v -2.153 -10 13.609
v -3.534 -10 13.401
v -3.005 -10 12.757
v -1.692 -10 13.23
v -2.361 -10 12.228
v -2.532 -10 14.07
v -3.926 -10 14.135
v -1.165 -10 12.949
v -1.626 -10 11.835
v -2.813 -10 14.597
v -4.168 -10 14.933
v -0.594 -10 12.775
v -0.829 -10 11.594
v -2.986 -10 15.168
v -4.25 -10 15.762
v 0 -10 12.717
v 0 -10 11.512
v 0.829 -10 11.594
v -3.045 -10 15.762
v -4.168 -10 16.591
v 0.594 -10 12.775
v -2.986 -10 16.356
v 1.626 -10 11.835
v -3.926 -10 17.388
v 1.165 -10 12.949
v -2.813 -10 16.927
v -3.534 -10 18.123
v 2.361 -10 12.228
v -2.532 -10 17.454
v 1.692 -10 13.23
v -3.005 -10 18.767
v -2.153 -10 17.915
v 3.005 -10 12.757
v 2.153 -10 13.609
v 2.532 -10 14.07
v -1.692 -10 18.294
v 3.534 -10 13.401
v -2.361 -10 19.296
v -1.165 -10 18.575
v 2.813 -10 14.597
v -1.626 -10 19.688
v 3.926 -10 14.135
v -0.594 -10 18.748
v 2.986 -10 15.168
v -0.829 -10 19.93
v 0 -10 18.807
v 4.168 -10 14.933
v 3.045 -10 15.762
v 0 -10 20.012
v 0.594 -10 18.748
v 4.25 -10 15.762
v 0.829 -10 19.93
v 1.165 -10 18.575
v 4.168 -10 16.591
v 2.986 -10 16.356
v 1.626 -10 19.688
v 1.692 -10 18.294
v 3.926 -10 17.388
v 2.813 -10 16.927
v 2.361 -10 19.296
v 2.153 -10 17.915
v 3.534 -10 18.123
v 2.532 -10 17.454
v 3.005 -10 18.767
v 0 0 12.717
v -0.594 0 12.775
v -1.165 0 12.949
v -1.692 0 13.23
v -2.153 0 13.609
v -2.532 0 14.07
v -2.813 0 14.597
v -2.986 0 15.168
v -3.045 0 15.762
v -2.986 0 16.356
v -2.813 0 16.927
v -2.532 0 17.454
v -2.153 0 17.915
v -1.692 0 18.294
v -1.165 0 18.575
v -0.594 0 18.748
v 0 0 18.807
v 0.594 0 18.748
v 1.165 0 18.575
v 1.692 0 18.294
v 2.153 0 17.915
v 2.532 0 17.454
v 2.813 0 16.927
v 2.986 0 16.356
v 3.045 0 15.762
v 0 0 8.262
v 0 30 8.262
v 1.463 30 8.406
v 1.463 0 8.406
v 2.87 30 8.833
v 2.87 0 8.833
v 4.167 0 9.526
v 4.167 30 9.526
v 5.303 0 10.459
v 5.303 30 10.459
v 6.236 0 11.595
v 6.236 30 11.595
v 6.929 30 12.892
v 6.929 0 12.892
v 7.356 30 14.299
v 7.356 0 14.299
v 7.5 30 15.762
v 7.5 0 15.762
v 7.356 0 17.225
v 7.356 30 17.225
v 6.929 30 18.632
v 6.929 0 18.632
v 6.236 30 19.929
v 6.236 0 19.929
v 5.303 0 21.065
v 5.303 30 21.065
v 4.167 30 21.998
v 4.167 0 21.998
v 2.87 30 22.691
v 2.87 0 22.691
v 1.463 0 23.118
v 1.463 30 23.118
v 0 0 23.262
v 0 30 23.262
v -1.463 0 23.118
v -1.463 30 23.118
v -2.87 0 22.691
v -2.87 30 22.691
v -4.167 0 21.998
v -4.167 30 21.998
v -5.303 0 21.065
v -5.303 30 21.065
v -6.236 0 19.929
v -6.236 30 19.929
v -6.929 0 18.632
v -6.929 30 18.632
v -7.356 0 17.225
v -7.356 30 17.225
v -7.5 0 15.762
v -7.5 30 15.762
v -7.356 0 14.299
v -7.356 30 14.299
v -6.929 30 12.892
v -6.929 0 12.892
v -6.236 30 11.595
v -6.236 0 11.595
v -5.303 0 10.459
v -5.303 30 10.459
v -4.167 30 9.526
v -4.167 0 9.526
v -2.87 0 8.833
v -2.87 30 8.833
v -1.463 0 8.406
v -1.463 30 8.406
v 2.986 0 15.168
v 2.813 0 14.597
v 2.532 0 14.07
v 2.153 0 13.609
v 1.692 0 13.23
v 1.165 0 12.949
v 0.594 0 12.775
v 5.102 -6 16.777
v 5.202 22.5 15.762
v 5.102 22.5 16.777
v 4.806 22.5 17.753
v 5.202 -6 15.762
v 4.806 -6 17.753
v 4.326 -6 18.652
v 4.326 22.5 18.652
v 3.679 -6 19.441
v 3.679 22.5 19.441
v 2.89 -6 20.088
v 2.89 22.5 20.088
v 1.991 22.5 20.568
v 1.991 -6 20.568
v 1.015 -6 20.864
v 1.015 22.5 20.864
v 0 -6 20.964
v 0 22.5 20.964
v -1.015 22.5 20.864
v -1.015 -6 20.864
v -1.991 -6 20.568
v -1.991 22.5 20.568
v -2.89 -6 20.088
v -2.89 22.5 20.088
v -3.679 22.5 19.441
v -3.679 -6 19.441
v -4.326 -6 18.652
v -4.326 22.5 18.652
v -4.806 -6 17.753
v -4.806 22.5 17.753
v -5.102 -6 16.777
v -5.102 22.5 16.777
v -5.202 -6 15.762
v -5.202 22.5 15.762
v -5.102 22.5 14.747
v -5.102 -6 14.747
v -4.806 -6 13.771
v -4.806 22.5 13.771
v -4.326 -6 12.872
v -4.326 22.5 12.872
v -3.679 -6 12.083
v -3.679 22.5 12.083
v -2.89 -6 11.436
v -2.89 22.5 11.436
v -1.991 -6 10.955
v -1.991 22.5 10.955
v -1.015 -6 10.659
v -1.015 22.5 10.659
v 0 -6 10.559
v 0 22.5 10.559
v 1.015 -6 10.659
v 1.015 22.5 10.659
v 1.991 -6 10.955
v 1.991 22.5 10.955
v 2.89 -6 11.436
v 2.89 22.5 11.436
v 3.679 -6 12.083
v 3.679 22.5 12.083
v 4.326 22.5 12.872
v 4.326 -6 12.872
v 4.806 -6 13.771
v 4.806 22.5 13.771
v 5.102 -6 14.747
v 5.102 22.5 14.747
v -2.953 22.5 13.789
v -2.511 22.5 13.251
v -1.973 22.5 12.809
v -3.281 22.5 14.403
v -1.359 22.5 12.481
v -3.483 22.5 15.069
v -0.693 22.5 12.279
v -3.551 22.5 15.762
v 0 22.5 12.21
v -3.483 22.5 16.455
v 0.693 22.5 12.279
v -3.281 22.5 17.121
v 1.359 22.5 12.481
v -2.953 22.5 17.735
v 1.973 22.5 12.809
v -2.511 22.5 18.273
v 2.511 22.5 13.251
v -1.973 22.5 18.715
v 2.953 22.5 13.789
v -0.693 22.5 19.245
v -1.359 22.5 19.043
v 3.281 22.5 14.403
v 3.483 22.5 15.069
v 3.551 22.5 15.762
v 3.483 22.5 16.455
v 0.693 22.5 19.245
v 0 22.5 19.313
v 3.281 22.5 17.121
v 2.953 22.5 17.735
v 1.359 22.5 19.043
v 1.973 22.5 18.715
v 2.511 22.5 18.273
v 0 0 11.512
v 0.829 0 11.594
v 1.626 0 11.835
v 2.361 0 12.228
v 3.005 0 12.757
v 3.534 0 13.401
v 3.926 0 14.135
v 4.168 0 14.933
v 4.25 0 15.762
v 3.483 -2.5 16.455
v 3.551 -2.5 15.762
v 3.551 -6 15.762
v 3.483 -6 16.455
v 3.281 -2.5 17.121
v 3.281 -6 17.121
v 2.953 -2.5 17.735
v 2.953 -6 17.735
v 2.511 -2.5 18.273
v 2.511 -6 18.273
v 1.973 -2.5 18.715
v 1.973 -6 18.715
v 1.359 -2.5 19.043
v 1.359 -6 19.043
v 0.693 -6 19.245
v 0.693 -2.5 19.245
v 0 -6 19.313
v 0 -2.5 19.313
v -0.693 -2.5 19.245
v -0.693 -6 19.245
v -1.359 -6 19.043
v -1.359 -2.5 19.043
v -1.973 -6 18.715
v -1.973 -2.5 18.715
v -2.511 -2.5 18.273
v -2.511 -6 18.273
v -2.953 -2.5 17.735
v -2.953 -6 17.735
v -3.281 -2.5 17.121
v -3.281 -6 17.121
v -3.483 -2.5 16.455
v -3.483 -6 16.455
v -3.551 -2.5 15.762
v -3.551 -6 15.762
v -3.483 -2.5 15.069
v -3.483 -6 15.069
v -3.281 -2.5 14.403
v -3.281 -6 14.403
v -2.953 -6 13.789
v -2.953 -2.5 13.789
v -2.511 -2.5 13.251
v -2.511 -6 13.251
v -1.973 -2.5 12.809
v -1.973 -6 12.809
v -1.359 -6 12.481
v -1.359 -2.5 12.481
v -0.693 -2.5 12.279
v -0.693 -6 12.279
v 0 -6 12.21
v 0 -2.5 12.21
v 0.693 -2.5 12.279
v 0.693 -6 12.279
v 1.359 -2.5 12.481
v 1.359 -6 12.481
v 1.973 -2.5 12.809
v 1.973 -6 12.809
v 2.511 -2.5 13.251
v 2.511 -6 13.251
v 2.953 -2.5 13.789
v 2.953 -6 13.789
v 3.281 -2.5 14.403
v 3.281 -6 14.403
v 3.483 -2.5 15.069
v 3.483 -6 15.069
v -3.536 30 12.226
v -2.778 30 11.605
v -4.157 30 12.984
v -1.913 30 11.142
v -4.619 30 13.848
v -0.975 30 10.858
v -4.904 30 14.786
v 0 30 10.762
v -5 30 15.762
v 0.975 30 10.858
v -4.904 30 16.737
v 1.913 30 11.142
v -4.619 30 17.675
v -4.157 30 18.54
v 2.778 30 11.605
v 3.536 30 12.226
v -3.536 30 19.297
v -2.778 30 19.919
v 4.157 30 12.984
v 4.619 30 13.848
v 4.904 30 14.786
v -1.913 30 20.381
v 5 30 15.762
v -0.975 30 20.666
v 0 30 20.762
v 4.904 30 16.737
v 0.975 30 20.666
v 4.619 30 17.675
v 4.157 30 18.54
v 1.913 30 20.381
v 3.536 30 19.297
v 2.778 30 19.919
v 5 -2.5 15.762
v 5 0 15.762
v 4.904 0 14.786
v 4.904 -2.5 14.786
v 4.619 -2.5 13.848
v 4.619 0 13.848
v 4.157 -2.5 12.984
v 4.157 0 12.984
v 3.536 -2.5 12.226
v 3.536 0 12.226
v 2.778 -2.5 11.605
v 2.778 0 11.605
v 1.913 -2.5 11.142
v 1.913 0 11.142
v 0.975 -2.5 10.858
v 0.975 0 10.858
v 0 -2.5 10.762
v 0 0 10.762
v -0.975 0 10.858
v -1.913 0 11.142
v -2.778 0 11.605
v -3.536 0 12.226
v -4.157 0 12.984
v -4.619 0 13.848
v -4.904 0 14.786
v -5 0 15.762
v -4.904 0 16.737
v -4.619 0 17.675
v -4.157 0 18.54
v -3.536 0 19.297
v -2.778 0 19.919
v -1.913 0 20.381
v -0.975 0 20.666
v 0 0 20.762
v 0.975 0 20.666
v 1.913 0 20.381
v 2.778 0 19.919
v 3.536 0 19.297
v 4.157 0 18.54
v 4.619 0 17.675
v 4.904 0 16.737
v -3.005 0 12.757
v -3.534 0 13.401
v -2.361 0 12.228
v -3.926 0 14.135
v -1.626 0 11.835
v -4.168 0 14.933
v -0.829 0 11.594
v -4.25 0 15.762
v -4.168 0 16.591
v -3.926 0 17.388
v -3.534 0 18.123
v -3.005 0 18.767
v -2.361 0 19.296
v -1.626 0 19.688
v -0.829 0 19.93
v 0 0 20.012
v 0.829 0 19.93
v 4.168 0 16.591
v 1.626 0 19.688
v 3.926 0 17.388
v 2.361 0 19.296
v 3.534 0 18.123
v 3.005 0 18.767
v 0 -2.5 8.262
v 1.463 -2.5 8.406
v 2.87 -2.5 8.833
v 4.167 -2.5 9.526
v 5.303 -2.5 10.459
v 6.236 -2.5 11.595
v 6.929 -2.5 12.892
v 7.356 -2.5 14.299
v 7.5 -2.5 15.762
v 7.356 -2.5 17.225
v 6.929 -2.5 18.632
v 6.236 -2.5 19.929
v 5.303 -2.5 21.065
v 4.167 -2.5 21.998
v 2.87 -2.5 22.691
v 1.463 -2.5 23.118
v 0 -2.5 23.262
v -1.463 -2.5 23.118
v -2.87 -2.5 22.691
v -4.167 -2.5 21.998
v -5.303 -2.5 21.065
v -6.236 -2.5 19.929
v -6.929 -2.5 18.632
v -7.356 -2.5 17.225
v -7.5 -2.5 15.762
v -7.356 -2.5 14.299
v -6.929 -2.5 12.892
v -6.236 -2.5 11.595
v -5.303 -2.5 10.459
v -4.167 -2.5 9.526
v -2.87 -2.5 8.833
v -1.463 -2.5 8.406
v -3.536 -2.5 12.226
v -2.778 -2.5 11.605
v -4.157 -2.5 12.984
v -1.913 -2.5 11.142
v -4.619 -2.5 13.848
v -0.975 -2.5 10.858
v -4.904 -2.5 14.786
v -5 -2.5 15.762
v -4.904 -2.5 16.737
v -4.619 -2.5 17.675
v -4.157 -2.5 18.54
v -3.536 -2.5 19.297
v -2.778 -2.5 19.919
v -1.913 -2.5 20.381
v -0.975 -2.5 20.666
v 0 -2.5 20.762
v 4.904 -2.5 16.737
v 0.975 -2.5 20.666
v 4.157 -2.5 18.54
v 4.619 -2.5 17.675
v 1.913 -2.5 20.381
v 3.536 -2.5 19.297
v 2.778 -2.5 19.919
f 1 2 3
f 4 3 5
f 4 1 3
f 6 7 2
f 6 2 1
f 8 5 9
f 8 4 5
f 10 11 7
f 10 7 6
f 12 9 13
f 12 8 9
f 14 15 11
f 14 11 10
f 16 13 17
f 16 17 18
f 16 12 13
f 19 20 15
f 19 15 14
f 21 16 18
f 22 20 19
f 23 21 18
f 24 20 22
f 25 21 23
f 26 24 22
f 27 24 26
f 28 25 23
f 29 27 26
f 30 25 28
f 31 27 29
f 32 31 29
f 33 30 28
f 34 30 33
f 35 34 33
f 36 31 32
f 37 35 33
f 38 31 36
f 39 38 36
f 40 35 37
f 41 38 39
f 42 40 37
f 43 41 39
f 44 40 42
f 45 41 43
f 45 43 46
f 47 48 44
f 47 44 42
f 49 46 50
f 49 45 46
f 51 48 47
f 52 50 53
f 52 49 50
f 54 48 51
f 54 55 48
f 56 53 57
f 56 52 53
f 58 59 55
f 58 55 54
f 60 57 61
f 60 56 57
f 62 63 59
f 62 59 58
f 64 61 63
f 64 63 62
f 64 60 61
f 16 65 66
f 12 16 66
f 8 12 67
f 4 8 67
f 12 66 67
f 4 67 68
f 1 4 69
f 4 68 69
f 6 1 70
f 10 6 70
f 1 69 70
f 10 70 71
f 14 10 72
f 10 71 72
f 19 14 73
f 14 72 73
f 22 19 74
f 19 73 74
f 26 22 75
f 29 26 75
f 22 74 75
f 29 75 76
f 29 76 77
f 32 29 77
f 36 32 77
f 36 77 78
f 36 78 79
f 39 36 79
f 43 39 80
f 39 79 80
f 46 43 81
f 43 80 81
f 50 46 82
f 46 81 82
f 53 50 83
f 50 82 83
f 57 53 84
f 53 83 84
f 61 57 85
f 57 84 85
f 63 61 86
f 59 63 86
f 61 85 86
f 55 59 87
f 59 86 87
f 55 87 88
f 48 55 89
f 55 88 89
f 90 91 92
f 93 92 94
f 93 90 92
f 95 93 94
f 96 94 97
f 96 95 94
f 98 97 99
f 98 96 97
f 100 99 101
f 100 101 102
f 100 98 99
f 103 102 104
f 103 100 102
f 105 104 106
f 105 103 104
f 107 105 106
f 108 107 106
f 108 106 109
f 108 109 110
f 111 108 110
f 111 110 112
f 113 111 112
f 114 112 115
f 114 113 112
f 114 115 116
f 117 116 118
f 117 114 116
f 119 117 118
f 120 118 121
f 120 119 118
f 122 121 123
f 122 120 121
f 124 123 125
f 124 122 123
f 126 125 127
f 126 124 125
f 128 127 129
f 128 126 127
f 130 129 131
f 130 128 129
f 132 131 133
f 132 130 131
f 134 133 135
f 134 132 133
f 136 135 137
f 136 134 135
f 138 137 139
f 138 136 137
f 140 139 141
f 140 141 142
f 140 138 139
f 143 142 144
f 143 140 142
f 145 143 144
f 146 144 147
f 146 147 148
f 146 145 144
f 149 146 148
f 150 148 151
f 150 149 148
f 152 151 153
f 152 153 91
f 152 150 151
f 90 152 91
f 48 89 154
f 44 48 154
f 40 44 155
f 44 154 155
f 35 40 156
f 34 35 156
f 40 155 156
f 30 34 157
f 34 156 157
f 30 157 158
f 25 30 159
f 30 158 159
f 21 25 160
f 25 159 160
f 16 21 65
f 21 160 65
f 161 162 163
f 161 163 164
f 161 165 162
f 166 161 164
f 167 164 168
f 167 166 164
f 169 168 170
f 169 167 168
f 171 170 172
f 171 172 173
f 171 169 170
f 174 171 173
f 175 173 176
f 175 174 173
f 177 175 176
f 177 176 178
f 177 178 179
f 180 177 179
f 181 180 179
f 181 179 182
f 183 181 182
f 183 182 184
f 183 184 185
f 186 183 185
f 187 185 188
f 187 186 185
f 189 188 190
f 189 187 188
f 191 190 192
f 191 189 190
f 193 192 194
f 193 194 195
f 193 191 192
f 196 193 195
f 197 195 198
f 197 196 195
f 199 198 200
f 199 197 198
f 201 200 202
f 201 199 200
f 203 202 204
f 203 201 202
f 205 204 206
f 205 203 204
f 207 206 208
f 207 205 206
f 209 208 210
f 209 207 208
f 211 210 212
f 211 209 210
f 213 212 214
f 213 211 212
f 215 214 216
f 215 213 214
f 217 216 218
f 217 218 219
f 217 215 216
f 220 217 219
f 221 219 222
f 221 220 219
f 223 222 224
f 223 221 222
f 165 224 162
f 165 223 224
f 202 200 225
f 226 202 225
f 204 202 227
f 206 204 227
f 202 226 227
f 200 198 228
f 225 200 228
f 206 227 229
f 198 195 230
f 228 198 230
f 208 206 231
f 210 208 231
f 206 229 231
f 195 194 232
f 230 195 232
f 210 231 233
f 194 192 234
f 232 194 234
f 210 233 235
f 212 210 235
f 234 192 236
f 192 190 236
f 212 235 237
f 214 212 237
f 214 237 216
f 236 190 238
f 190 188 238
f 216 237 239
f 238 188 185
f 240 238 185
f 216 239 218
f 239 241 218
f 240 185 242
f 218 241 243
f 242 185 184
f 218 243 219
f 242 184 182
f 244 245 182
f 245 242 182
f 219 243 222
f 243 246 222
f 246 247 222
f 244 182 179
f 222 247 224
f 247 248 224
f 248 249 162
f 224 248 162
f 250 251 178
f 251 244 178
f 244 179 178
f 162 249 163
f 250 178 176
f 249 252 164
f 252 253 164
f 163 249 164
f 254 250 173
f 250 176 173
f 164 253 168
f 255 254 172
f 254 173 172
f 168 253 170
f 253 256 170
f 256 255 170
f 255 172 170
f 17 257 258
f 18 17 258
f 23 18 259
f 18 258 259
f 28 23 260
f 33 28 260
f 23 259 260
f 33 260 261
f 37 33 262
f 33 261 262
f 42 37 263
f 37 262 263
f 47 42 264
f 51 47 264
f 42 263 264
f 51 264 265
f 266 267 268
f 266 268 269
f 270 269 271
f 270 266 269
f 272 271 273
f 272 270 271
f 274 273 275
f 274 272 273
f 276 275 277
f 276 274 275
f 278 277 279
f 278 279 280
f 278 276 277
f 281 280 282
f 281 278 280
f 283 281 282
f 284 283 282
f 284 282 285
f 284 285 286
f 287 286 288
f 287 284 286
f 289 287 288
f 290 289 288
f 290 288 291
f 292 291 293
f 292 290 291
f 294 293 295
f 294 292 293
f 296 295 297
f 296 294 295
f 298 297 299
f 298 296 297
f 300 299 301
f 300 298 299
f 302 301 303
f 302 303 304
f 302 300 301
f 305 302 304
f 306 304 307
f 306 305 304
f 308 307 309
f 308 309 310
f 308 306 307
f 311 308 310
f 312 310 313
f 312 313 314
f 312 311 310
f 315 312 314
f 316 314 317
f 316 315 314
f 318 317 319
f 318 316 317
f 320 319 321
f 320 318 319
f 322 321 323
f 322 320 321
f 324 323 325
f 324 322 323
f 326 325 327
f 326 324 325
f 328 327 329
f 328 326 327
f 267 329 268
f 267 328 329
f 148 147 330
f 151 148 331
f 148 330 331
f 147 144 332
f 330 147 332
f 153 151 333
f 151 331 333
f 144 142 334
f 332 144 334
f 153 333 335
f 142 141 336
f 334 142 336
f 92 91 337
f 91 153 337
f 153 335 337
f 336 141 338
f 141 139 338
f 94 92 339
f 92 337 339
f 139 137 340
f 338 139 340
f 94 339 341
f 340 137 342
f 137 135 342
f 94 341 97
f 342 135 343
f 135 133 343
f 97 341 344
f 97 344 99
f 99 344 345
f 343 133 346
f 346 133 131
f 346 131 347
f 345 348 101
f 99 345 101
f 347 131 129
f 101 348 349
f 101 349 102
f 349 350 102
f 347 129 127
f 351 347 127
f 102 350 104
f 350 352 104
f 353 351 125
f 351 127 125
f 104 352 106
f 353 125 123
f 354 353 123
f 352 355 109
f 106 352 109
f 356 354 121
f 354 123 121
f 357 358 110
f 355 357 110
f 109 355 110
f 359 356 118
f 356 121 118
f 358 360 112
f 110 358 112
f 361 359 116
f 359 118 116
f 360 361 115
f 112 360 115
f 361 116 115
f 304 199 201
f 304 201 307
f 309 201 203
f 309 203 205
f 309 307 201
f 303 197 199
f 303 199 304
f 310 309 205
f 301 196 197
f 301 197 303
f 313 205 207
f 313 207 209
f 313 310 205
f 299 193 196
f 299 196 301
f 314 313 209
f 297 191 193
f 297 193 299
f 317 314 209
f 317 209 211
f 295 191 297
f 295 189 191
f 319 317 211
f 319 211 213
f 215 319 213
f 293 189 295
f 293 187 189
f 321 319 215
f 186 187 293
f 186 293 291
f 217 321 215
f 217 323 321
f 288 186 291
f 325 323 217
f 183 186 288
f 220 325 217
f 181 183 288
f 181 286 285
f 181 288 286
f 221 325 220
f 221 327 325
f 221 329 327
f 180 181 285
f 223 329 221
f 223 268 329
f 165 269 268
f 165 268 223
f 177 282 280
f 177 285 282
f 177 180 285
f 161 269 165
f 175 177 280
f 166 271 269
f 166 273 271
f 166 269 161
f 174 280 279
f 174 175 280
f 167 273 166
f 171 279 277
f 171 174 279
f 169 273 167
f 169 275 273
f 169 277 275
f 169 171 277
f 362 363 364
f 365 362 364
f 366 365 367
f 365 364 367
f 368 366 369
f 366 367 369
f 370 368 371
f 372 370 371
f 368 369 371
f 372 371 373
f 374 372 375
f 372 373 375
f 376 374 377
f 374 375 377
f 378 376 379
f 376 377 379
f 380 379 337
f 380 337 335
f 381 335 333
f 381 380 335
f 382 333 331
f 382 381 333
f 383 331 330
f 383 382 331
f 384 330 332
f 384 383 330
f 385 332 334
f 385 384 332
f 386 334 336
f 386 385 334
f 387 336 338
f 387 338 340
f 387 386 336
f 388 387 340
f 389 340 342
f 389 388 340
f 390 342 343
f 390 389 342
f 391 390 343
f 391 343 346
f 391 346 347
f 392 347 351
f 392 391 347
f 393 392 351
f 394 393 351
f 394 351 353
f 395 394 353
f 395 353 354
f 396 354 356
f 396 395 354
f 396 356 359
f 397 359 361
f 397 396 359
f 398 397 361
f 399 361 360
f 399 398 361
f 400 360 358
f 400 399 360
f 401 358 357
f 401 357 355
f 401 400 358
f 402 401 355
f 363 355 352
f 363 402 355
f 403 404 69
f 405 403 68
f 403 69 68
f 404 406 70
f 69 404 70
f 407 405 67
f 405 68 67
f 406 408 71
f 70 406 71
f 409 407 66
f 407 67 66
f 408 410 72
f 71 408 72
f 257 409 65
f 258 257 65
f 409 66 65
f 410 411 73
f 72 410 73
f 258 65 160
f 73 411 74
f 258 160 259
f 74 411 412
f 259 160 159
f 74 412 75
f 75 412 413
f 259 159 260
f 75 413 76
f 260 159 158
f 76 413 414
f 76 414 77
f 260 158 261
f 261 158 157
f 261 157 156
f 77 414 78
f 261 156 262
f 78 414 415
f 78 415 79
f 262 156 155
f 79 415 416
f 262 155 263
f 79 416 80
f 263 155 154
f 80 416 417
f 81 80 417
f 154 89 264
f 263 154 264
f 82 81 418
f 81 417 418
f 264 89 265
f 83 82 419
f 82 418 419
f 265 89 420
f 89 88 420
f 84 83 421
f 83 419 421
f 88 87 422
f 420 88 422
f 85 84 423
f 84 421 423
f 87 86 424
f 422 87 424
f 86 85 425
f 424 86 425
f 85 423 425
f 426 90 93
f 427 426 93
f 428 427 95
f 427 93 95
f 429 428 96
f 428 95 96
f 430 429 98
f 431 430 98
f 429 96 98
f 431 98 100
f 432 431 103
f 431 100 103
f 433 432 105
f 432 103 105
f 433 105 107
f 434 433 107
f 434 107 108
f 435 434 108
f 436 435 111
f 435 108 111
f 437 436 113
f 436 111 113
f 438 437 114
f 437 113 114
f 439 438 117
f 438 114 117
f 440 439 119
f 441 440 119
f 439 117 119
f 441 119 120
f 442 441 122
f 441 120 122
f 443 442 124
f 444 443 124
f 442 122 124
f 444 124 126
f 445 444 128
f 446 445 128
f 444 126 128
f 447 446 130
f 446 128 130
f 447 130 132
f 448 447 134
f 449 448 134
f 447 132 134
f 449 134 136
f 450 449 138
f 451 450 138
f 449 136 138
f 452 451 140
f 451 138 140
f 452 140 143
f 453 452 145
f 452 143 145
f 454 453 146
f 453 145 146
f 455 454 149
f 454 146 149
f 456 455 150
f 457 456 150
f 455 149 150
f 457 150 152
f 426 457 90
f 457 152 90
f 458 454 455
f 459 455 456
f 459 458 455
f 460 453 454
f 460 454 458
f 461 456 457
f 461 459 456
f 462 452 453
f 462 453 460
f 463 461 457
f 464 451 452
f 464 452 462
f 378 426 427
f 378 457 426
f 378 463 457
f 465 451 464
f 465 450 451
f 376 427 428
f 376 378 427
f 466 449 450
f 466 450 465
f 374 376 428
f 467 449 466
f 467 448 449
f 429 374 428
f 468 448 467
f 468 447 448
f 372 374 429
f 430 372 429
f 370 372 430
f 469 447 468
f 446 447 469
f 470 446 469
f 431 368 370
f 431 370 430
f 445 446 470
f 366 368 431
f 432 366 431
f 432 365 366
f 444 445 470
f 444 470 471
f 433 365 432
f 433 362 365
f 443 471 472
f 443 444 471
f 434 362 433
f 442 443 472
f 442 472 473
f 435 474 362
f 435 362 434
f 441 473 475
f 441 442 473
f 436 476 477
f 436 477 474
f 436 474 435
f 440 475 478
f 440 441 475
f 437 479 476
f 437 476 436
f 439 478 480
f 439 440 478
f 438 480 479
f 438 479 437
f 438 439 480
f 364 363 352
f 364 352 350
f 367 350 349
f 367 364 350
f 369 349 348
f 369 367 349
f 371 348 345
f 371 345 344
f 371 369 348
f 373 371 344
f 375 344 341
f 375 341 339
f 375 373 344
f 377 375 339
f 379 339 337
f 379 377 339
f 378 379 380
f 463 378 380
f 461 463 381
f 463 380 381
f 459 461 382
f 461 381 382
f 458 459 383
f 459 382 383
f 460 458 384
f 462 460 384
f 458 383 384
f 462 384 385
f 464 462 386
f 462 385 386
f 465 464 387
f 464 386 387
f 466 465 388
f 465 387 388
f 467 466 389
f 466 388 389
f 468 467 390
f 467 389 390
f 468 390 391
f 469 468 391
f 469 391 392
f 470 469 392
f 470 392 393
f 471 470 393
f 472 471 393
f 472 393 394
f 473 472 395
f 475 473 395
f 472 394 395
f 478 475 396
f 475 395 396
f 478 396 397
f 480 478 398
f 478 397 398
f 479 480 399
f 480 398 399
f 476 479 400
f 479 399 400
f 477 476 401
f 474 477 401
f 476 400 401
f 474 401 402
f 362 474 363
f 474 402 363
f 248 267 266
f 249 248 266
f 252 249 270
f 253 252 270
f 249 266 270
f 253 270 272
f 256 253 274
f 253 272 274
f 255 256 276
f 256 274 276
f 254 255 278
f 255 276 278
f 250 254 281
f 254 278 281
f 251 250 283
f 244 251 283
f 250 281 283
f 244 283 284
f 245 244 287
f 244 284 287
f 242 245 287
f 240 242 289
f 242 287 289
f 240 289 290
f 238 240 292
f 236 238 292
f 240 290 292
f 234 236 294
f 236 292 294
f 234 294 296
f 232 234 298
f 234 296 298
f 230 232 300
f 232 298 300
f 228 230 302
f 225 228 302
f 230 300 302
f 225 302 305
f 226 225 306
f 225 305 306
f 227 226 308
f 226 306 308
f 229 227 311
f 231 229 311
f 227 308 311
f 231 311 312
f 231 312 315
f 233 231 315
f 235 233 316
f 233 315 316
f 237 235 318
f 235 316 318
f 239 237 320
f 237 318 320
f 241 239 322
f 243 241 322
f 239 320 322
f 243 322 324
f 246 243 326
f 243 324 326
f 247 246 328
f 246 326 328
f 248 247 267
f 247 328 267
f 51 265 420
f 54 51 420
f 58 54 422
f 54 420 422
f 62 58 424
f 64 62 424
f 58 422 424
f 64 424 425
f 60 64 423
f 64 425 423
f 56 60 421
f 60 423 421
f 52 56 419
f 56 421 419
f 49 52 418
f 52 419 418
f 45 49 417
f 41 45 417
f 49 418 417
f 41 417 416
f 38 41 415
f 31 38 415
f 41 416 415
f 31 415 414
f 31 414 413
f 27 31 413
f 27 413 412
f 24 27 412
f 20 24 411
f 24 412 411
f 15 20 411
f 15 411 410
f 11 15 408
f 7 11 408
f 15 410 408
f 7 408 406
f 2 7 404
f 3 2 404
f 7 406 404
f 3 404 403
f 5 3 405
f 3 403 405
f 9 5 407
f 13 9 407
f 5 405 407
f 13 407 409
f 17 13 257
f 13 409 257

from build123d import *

# Parameters (mm, degrees)
F1_DEPTH      = 10
F3_DEPTH      = 30
F3_DEPTH_BACK = 2.5
F4_R          = 5.2024526328
F4_R_2        = 3.55143811
F5_DEPTH      = 3.5
F5_DEPTH_BACK = 25


with BuildPart() as f1:
    # F0 (on Front) → F1 (new body)
    with BuildSketch(Plane.XZ):
        with BuildLine():
            ThreePointArc((4.25, 15.7618727535), (-3.00520382, 18.7670765735), (0, 11.5118727535))
            ThreePointArc((0, 11.5118727535), (3.00520382, 12.7566689335), (4.25, 15.7618727535))
        make_face()
        with BuildLine():
            ThreePointArc((0, 12.7168727535), (-2.1531401487, 17.9150129022), (3.045, 15.7618727535))
            ThreePointArc((3.045, 15.7618727535), (2.1531401487, 13.6087326048), (0, 12.7168727535))
        make_face(mode=Mode.SUBTRACT)
    extrude(amount=F1_DEPTH)


with BuildPart() as f3:
    # F2 (on Front) → F3 (new body, two sides)
    with BuildSketch(Plane.XZ) as f3_sk:
        with BuildLine():
            ThreePointArc((7.5, 15.76187), (-5.3033008589, 21.0651708589), (0, 8.26187))
            ThreePointArc((0, 8.26187), (5.3033008589, 10.4585691411), (7.5, 15.76187))
        make_face()
        with BuildLine():
            ThreePointArc((5, 15.76187), (3.5355339059, 12.2263360941), (0, 10.76187))
            ThreePointArc((0, 10.76187), (-3.5355339059, 19.2974039059), (5, 15.76187))
        make_face(mode=Mode.SUBTRACT)
    extrude(amount=-F3_DEPTH)
    extrude(f3_sk.sketch, amount=F3_DEPTH_BACK)


with BuildPart() as f5:
    # F4 (on face) → F5 (new body, two sides)
    with BuildSketch(Plane.XZ.offset(2.5)) as f5_sk:
        with Locations((0, 15.76187)):
            Circle(F4_R)
        with Locations((0, 15.76187)):
            Circle(F4_R_2, mode=Mode.SUBTRACT)
    extrude(amount=F5_DEPTH)
    extrude(f5_sk.sketch, amount=-F5_DEPTH_BACK)


solid = Compound([f1.part, f3.part, f5.part])
